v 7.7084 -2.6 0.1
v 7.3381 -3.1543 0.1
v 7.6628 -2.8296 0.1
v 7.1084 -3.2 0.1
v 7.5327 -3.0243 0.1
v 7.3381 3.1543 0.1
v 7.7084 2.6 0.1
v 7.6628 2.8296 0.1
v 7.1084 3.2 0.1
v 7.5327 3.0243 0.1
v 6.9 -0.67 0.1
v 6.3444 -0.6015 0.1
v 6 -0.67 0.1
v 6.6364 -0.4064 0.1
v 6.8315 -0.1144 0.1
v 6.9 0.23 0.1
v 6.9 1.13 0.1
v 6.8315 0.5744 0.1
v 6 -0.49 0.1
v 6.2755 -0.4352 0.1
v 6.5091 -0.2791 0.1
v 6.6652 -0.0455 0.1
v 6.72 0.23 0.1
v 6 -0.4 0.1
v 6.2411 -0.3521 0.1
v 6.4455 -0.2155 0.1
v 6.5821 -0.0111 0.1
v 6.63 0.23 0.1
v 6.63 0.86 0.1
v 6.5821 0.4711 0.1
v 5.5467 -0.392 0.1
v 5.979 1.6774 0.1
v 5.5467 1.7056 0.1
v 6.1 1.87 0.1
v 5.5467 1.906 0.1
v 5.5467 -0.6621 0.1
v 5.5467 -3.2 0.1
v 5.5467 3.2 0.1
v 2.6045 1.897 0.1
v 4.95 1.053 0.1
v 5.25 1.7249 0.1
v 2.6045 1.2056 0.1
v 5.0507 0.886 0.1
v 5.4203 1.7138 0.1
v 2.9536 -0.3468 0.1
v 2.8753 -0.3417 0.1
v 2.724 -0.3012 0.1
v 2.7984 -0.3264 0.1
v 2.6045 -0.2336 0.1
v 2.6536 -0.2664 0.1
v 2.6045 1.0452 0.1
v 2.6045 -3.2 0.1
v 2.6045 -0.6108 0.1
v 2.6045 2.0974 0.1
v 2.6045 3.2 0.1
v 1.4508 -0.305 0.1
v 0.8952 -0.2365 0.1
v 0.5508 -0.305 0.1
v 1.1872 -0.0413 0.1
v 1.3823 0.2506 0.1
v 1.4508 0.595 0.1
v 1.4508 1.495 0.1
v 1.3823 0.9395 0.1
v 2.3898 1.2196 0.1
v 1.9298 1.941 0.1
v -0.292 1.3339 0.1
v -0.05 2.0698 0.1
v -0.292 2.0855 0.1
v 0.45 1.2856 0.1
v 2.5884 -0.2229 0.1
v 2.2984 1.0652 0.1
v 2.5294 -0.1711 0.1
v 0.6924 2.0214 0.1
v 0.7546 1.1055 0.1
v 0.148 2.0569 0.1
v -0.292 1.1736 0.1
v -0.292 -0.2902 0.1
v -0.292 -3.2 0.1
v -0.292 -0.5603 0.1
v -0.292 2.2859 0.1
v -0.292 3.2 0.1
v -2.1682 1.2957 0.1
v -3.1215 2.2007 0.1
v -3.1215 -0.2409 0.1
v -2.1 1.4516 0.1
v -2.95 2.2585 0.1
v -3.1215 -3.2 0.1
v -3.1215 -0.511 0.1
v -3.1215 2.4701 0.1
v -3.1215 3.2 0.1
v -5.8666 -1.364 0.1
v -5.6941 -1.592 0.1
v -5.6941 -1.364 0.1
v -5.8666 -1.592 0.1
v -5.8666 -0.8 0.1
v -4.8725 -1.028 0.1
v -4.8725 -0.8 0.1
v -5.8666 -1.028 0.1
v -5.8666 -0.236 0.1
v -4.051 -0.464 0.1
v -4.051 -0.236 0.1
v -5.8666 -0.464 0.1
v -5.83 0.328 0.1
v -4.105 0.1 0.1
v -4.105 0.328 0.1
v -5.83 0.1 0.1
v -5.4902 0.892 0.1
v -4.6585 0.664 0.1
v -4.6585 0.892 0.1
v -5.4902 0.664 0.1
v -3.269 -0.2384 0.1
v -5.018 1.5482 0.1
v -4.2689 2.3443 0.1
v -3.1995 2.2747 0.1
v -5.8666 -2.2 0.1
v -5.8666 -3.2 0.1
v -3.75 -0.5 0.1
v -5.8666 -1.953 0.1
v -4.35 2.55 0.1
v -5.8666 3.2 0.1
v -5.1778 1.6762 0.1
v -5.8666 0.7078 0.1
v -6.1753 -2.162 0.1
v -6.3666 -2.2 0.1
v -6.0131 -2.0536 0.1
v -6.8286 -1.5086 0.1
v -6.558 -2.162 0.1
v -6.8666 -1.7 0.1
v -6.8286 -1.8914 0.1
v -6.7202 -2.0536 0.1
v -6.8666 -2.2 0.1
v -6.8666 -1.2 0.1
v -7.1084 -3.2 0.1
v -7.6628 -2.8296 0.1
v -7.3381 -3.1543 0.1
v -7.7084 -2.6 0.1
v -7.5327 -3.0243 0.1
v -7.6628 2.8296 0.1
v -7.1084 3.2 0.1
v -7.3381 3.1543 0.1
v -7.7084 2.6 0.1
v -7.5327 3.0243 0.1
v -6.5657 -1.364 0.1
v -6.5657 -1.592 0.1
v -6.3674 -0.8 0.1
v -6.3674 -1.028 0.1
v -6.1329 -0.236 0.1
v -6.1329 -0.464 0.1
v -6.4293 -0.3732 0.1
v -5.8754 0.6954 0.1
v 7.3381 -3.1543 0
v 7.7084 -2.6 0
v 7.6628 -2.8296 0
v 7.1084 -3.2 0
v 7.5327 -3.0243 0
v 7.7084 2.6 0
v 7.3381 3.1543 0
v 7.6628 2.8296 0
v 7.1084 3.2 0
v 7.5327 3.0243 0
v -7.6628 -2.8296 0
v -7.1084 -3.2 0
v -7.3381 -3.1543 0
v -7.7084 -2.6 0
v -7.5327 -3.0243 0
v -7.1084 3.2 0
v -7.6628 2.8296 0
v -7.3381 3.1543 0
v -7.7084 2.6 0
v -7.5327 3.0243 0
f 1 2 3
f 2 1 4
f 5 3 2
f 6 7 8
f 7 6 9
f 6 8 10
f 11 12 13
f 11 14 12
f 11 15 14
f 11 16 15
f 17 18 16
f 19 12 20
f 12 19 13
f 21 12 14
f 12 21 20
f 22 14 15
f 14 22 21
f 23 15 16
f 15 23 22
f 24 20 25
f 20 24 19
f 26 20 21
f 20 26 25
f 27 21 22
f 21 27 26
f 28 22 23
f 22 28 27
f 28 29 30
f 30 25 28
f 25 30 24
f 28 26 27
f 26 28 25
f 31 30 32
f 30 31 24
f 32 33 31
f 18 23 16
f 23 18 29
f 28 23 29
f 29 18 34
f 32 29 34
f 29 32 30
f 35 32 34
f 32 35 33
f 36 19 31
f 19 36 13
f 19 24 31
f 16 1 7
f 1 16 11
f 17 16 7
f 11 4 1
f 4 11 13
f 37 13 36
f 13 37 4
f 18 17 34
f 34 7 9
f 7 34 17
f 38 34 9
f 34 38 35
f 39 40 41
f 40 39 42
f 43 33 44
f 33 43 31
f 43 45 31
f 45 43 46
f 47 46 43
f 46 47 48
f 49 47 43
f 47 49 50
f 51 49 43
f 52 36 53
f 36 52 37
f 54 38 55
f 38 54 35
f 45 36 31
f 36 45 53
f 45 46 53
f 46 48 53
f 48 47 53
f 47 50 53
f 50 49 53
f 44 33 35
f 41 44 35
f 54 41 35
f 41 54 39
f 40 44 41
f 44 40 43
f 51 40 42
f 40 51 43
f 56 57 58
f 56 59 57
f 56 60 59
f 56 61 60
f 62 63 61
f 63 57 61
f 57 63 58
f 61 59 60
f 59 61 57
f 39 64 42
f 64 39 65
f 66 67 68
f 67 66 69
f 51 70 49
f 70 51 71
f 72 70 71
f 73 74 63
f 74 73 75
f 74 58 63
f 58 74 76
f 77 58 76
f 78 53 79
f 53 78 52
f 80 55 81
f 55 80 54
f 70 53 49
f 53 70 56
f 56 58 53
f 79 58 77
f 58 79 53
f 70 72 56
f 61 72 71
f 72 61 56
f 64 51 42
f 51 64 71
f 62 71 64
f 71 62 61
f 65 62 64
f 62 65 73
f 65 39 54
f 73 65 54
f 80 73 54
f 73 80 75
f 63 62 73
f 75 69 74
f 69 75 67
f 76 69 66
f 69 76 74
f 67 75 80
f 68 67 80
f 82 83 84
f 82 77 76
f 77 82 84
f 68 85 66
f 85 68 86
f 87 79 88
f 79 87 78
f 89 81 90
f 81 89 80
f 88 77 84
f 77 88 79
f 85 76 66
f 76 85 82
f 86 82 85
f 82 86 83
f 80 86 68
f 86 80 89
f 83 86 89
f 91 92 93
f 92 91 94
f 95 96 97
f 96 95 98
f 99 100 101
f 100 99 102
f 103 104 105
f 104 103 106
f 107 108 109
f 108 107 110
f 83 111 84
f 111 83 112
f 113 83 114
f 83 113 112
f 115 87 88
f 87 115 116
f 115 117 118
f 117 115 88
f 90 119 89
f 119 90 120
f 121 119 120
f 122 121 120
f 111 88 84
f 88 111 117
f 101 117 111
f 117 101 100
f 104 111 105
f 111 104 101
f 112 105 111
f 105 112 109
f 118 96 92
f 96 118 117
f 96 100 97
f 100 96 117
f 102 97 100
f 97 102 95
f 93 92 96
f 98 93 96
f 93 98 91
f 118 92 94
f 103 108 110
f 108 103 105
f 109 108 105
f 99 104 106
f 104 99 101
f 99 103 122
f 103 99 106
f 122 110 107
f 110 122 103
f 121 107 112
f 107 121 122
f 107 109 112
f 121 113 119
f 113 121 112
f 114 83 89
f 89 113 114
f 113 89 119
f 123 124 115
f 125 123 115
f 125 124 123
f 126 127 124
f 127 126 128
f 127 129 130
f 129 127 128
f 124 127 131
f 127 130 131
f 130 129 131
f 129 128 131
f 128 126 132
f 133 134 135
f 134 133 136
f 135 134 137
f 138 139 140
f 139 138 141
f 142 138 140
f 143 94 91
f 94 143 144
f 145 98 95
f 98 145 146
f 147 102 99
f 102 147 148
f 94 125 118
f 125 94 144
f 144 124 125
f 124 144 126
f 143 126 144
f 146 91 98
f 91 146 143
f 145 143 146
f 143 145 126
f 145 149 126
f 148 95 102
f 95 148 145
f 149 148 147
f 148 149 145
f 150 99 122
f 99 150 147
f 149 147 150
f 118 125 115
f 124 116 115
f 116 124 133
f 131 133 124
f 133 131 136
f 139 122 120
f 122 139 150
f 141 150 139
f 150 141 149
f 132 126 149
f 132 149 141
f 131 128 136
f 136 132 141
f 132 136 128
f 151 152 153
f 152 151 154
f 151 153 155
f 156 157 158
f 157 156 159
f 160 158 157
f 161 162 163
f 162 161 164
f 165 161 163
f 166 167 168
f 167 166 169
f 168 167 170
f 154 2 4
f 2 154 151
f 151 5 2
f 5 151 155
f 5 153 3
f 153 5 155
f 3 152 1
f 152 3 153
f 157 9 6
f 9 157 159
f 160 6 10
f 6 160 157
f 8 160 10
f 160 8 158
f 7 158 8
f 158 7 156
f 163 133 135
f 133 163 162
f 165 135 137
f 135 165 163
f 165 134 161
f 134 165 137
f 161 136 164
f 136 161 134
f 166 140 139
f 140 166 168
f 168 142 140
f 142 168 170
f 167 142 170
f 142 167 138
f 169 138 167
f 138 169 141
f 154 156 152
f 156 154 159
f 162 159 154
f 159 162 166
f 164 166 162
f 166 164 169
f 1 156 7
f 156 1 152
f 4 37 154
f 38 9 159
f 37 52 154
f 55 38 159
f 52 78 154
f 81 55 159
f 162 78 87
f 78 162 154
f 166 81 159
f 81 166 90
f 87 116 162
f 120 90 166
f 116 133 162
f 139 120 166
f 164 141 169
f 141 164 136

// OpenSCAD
use <../lib.scad>
use <6142622i.scad>
function ldraw_lib__6142622j() = [
// 0 Sticker  0.8 x  1.9 with Red and White Taillamp on Yellow Background Left
// 0 Name: 6142622j.dat
// 0 Author: Massimo Maso [Sirio]
// 0 !LDRAW_ORG Part UPDATE 2022-03
// 0 !LICENSE Licensed under CC BY 2.0 and CC BY 4.0 : see CAreadme.txt
// 
// 0 BFC CERTIFY CCW
  [0,"BFC","CERTIFY"],
  [0,"BFC","CCW"],
// 
// 0 !KEYWORDS Chevrolet, Corvette, Set 75870, Speed Champions
// 
// 0 !HISTORY 2022-05-07 [PTadmin] Official Update 2022-03
// 
// 
// 1 16 0 0 0 -1 0 0 0 1 0 0 0 1 6142622i.dat
  [1,16,0,0,0,-1,0,0,0,1,0,0,0,1, ldraw_lib__6142622i()],
];
module ldraw_lib__6142622j(step=0, col=false, unit=2/5, alt=false, line=0.2, solid=!$preview)
    makepoly(ldraw_lib__6142622j(), step=step, col=col, unit=unit, alt=alt, line=line, solid=solid);
ldraw_lib__6142622j(line=0.2);
